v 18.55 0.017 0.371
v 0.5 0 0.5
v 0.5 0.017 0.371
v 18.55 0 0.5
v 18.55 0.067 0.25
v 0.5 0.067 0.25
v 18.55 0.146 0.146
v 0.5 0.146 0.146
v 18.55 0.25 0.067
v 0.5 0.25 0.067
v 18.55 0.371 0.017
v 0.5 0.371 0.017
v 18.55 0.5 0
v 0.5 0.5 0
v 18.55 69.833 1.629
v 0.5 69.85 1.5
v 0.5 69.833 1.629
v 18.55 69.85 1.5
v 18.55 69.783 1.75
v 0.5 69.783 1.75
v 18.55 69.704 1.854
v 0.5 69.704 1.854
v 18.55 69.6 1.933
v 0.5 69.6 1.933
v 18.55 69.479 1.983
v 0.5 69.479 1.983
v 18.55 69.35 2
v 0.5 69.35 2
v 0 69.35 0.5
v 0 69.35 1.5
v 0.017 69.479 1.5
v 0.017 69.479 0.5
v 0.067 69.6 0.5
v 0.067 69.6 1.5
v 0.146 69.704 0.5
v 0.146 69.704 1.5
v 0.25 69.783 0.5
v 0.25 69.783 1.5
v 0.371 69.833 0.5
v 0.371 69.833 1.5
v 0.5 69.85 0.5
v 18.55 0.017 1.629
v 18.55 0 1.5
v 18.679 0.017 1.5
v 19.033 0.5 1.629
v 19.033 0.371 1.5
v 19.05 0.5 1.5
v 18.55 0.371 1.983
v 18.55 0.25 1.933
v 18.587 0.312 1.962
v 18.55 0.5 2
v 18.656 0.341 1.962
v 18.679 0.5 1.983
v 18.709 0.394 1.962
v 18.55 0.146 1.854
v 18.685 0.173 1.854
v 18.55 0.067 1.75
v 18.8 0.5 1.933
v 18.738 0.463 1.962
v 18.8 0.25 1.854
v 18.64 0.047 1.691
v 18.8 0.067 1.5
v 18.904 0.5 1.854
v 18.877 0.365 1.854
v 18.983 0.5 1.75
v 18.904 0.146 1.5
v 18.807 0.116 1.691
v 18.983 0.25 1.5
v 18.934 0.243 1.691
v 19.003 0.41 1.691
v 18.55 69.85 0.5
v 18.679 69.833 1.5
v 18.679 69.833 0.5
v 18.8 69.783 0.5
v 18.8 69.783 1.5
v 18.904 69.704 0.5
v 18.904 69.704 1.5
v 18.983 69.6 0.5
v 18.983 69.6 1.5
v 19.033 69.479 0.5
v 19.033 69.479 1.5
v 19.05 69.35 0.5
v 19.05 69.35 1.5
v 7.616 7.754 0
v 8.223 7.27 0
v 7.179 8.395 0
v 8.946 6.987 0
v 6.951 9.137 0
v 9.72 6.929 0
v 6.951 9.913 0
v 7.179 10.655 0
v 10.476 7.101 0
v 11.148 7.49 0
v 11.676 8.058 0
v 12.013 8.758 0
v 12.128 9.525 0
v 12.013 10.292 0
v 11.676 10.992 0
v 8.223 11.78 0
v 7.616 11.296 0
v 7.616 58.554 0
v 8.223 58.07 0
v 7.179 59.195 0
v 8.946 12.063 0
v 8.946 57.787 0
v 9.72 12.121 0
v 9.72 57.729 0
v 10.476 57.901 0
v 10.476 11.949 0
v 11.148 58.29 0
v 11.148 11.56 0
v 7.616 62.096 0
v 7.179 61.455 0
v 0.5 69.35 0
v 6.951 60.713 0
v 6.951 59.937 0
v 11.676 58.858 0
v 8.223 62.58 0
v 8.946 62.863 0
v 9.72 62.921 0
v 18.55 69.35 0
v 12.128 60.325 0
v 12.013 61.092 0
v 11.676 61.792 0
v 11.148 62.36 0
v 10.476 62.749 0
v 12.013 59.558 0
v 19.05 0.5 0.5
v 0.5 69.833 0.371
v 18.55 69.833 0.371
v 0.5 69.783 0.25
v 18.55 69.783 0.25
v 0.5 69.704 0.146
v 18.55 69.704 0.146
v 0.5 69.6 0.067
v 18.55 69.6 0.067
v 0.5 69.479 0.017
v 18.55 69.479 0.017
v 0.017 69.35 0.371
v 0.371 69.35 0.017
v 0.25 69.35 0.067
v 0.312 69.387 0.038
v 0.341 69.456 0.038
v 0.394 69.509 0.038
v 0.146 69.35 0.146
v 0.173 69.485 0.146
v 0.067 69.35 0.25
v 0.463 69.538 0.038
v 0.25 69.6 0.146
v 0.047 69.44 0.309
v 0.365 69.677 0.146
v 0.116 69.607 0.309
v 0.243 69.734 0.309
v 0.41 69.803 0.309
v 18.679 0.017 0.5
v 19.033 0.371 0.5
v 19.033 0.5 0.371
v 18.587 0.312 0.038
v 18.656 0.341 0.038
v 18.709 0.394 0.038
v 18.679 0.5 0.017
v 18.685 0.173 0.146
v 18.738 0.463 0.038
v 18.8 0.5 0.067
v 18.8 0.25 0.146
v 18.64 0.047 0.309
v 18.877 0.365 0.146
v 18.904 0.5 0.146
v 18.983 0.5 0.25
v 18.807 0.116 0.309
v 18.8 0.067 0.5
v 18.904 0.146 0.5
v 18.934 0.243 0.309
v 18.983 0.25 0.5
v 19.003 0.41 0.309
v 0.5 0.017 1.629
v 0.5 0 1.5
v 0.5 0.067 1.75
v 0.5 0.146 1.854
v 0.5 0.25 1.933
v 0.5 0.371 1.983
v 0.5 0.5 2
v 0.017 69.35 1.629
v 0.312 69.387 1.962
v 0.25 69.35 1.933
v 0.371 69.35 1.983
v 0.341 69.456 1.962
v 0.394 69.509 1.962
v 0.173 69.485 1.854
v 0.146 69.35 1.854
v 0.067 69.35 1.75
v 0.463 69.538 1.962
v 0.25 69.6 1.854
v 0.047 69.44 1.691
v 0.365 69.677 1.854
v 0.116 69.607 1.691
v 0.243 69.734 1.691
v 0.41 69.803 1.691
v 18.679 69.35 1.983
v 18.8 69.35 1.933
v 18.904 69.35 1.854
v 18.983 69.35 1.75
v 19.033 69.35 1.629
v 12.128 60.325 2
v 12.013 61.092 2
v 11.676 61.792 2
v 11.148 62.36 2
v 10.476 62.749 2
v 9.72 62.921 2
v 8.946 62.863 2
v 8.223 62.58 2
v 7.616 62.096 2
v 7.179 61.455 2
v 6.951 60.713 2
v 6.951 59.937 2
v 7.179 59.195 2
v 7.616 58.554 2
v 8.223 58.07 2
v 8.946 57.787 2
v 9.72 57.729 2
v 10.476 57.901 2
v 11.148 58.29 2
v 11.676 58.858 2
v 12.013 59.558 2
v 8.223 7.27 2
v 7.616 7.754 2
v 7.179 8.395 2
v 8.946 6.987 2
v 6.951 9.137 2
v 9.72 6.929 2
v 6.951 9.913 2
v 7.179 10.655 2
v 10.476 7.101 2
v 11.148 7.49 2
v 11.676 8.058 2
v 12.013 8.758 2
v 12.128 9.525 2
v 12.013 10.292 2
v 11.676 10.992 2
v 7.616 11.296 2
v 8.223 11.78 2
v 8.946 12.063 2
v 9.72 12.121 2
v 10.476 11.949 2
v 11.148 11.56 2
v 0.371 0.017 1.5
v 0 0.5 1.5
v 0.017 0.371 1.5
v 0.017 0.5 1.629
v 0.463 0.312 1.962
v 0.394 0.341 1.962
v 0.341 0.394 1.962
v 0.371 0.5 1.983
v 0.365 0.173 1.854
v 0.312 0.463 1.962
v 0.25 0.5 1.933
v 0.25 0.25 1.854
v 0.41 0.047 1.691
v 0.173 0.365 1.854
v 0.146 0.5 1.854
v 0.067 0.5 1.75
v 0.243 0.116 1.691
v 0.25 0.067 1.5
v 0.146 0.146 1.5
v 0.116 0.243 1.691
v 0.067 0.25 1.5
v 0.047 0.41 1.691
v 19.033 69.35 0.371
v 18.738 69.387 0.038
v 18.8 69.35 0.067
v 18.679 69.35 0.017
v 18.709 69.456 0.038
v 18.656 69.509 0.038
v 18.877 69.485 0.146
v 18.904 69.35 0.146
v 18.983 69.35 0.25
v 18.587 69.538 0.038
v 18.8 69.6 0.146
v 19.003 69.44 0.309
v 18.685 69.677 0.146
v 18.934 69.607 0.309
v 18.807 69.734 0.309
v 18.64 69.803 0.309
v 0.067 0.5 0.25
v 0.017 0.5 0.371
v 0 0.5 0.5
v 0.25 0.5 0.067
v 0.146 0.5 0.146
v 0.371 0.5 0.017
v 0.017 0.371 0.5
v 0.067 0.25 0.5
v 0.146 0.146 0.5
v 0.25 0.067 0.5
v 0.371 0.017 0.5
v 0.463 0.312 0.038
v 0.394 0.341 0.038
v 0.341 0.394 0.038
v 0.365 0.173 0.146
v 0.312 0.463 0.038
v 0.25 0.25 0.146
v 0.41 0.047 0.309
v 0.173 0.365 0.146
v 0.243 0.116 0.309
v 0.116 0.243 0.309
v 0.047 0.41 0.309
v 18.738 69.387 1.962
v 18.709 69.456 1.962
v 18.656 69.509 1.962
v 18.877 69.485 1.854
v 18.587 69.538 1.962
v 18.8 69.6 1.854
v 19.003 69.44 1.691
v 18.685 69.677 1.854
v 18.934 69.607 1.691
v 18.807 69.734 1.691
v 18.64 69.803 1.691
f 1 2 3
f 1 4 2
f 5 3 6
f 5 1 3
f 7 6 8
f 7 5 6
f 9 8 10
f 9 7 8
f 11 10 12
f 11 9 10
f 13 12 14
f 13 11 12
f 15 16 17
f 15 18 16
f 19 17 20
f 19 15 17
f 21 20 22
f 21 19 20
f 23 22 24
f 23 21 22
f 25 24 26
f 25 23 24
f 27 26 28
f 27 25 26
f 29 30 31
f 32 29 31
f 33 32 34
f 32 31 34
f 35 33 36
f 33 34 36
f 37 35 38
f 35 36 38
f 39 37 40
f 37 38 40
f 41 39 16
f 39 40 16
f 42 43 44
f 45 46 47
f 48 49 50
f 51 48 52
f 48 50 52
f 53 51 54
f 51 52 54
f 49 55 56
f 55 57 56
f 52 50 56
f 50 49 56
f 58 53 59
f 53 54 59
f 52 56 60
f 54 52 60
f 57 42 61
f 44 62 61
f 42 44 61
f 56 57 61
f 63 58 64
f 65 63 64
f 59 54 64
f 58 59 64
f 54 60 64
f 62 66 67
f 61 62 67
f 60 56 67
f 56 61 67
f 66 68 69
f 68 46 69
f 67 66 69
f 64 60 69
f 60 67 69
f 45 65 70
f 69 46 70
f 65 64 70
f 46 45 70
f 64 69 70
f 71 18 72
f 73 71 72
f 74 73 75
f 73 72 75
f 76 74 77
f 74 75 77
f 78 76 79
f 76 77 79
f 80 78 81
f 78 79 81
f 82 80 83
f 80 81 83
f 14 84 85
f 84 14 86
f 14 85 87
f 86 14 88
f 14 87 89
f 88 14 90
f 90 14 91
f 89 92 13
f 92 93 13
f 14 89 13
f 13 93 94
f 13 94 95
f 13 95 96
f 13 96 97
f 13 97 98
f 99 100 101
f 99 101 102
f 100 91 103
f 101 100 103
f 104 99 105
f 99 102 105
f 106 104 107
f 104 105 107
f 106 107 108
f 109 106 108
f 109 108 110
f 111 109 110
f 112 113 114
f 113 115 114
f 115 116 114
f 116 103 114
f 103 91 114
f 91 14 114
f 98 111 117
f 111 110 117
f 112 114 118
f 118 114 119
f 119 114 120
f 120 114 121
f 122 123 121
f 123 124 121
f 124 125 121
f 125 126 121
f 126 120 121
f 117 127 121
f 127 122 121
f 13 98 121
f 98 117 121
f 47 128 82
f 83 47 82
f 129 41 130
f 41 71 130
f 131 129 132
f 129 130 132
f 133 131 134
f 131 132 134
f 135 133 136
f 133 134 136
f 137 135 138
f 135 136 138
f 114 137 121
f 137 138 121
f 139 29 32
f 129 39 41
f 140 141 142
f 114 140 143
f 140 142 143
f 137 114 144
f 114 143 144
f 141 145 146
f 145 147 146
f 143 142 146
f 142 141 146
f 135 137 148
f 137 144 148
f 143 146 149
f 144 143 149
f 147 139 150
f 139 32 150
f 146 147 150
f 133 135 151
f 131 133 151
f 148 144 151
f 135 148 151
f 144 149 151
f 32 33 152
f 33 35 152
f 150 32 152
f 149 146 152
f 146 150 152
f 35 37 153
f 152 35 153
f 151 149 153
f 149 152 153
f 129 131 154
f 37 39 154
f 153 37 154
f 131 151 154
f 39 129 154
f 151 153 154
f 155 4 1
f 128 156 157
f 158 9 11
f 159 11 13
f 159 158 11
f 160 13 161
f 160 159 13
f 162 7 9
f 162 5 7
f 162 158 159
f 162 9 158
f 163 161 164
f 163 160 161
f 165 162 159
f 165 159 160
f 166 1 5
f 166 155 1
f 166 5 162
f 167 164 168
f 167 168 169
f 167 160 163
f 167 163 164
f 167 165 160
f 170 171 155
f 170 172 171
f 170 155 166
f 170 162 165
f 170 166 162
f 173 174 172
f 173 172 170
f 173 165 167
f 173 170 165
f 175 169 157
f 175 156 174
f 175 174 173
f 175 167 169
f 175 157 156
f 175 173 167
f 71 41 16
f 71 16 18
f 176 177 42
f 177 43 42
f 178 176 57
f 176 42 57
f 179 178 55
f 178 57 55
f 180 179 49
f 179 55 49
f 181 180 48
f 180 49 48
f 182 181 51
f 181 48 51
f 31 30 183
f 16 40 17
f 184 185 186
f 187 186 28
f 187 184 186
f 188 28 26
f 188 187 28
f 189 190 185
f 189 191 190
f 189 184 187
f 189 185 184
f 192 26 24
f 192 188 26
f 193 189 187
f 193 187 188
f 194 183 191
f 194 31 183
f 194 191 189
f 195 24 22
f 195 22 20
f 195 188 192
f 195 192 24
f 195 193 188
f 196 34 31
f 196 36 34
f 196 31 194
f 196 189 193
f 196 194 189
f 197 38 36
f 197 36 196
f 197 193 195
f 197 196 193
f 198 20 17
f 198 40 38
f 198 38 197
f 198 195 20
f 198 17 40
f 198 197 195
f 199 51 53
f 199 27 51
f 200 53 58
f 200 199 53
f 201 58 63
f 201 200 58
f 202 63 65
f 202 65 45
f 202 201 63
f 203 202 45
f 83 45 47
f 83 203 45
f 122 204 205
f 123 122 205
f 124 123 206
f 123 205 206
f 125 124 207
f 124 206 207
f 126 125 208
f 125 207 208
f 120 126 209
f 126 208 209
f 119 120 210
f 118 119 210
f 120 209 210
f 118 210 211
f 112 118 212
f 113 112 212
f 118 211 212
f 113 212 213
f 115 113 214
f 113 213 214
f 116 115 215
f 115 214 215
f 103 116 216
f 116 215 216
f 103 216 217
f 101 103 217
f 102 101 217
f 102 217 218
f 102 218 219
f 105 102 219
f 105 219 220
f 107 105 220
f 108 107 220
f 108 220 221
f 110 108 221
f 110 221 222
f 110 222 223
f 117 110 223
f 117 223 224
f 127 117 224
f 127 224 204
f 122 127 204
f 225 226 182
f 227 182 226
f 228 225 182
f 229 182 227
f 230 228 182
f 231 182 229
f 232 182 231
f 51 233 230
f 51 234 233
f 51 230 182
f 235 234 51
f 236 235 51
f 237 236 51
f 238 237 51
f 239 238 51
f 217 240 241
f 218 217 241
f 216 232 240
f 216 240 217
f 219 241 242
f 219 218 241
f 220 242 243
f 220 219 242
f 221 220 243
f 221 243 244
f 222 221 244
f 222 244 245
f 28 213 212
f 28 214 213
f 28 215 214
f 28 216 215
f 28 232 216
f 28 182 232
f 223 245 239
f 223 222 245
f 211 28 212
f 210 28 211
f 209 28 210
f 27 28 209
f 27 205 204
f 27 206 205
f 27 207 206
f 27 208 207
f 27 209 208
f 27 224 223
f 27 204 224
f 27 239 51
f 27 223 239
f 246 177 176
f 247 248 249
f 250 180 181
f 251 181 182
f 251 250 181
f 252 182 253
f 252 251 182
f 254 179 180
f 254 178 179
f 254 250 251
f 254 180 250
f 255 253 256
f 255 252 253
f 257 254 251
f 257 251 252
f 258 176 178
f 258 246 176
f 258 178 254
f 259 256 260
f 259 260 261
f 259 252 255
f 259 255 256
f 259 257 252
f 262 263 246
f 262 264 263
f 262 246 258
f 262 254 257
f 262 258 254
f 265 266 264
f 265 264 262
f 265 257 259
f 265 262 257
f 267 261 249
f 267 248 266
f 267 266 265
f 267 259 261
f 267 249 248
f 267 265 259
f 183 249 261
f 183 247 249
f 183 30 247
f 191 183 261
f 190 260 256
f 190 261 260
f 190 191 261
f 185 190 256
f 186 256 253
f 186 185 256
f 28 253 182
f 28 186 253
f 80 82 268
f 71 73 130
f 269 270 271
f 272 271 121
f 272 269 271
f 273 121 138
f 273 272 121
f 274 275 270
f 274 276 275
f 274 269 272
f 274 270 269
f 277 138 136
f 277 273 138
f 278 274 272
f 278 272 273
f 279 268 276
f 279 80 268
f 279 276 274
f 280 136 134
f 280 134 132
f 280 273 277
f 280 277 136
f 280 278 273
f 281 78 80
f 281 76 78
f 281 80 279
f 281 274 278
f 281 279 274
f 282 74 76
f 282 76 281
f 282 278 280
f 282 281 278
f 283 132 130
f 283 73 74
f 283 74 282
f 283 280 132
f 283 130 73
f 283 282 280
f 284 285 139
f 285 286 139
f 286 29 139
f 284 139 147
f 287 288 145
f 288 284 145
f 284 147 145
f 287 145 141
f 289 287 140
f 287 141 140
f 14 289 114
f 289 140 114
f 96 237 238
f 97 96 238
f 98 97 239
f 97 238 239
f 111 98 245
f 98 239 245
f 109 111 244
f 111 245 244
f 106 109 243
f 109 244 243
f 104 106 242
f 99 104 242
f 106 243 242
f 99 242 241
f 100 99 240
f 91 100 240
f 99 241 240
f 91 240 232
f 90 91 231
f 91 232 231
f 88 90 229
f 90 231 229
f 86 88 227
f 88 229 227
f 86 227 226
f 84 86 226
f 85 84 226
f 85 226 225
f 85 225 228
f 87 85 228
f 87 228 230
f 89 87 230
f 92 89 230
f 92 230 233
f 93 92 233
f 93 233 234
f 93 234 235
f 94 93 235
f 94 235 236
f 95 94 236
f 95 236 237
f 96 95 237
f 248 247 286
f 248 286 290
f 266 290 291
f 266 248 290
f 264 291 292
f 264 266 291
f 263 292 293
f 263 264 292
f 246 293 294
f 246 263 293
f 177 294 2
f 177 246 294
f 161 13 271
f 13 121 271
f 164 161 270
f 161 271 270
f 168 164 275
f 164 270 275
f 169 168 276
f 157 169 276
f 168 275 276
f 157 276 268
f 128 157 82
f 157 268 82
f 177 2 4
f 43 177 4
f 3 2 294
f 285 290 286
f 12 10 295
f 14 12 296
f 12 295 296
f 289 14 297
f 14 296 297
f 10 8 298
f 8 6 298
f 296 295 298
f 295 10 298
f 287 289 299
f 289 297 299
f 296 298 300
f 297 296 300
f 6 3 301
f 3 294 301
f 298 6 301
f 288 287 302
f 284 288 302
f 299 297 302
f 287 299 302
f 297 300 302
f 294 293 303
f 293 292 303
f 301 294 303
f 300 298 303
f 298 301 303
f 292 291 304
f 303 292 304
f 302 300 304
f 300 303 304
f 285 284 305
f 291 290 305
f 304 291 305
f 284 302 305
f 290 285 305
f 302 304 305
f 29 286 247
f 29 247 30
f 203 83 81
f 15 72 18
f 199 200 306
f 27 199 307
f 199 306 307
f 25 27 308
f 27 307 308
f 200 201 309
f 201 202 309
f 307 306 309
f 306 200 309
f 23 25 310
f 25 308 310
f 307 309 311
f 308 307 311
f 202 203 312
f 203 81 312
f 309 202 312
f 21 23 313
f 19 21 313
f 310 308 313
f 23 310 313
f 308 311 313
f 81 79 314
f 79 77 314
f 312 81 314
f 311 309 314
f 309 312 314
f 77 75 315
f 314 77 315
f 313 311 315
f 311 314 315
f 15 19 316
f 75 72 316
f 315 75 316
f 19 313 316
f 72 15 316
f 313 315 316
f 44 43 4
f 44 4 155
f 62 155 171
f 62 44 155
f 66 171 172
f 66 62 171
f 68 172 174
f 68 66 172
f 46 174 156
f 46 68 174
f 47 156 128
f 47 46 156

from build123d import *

# Parameters (mm, degrees)
SKETCH022_W         = 19.05
SKETCH022_H         = 69.85
PAD009_DEPTH        = 2
SKETCH023_R         = 2.6035
POCKET011_DEPTH     = 2.001
LINEARPATTERN_COUNT = 2
LINEARPATTERN_PITCH = 50.8
FILLET008_R         = 0.5


with BuildPart() as part:
    # Sketch022 → Pad009 (new body)
    with BuildSketch(Plane.XY):
        with Locations((9.525, 34.925)):
            Rectangle(SKETCH022_W, SKETCH022_H)
    extrude(amount=PAD009_DEPTH)

    # Sketch023 (on Face6 of Pad009) → Pocket011 (cut, through all)
    with BuildSketch(Plane.XY.offset(2)):
        with Locations((9.525, 9.525)):
            Circle(SKETCH023_R)
    pocket011 = extrude(amount=-POCKET011_DEPTH, mode=Mode.SUBTRACT)

    # LinearPattern: Pocket011 ×2
    with Locations(*[(0, i * LINEARPATTERN_PITCH, 0) for i in range(1, LINEARPATTERN_COUNT)]):
        add(pocket011, mode=Mode.SUBTRACT)

    # Fillet008
    fillet008_edges = [part.edges().sort_by_distance(p)[0] for p in [
        (0, 0, 1),
        (19.05, 0, 1),
        (9.525, 0, 0),
        (9.525, 0, 2),
        (19.05, 69.85, 1),
        (19.05, 34.925, 0),
        (19.05, 34.925, 2),
        (0, 69.85, 1),
        (0, 34.925, 0),
        (0, 34.925, 2),
        (9.525, 69.85, 0),
        (9.525, 69.85, 2),
    ]]
    fillet(fillet008_edges, radius=FILLET008_R)


solid = part.part
